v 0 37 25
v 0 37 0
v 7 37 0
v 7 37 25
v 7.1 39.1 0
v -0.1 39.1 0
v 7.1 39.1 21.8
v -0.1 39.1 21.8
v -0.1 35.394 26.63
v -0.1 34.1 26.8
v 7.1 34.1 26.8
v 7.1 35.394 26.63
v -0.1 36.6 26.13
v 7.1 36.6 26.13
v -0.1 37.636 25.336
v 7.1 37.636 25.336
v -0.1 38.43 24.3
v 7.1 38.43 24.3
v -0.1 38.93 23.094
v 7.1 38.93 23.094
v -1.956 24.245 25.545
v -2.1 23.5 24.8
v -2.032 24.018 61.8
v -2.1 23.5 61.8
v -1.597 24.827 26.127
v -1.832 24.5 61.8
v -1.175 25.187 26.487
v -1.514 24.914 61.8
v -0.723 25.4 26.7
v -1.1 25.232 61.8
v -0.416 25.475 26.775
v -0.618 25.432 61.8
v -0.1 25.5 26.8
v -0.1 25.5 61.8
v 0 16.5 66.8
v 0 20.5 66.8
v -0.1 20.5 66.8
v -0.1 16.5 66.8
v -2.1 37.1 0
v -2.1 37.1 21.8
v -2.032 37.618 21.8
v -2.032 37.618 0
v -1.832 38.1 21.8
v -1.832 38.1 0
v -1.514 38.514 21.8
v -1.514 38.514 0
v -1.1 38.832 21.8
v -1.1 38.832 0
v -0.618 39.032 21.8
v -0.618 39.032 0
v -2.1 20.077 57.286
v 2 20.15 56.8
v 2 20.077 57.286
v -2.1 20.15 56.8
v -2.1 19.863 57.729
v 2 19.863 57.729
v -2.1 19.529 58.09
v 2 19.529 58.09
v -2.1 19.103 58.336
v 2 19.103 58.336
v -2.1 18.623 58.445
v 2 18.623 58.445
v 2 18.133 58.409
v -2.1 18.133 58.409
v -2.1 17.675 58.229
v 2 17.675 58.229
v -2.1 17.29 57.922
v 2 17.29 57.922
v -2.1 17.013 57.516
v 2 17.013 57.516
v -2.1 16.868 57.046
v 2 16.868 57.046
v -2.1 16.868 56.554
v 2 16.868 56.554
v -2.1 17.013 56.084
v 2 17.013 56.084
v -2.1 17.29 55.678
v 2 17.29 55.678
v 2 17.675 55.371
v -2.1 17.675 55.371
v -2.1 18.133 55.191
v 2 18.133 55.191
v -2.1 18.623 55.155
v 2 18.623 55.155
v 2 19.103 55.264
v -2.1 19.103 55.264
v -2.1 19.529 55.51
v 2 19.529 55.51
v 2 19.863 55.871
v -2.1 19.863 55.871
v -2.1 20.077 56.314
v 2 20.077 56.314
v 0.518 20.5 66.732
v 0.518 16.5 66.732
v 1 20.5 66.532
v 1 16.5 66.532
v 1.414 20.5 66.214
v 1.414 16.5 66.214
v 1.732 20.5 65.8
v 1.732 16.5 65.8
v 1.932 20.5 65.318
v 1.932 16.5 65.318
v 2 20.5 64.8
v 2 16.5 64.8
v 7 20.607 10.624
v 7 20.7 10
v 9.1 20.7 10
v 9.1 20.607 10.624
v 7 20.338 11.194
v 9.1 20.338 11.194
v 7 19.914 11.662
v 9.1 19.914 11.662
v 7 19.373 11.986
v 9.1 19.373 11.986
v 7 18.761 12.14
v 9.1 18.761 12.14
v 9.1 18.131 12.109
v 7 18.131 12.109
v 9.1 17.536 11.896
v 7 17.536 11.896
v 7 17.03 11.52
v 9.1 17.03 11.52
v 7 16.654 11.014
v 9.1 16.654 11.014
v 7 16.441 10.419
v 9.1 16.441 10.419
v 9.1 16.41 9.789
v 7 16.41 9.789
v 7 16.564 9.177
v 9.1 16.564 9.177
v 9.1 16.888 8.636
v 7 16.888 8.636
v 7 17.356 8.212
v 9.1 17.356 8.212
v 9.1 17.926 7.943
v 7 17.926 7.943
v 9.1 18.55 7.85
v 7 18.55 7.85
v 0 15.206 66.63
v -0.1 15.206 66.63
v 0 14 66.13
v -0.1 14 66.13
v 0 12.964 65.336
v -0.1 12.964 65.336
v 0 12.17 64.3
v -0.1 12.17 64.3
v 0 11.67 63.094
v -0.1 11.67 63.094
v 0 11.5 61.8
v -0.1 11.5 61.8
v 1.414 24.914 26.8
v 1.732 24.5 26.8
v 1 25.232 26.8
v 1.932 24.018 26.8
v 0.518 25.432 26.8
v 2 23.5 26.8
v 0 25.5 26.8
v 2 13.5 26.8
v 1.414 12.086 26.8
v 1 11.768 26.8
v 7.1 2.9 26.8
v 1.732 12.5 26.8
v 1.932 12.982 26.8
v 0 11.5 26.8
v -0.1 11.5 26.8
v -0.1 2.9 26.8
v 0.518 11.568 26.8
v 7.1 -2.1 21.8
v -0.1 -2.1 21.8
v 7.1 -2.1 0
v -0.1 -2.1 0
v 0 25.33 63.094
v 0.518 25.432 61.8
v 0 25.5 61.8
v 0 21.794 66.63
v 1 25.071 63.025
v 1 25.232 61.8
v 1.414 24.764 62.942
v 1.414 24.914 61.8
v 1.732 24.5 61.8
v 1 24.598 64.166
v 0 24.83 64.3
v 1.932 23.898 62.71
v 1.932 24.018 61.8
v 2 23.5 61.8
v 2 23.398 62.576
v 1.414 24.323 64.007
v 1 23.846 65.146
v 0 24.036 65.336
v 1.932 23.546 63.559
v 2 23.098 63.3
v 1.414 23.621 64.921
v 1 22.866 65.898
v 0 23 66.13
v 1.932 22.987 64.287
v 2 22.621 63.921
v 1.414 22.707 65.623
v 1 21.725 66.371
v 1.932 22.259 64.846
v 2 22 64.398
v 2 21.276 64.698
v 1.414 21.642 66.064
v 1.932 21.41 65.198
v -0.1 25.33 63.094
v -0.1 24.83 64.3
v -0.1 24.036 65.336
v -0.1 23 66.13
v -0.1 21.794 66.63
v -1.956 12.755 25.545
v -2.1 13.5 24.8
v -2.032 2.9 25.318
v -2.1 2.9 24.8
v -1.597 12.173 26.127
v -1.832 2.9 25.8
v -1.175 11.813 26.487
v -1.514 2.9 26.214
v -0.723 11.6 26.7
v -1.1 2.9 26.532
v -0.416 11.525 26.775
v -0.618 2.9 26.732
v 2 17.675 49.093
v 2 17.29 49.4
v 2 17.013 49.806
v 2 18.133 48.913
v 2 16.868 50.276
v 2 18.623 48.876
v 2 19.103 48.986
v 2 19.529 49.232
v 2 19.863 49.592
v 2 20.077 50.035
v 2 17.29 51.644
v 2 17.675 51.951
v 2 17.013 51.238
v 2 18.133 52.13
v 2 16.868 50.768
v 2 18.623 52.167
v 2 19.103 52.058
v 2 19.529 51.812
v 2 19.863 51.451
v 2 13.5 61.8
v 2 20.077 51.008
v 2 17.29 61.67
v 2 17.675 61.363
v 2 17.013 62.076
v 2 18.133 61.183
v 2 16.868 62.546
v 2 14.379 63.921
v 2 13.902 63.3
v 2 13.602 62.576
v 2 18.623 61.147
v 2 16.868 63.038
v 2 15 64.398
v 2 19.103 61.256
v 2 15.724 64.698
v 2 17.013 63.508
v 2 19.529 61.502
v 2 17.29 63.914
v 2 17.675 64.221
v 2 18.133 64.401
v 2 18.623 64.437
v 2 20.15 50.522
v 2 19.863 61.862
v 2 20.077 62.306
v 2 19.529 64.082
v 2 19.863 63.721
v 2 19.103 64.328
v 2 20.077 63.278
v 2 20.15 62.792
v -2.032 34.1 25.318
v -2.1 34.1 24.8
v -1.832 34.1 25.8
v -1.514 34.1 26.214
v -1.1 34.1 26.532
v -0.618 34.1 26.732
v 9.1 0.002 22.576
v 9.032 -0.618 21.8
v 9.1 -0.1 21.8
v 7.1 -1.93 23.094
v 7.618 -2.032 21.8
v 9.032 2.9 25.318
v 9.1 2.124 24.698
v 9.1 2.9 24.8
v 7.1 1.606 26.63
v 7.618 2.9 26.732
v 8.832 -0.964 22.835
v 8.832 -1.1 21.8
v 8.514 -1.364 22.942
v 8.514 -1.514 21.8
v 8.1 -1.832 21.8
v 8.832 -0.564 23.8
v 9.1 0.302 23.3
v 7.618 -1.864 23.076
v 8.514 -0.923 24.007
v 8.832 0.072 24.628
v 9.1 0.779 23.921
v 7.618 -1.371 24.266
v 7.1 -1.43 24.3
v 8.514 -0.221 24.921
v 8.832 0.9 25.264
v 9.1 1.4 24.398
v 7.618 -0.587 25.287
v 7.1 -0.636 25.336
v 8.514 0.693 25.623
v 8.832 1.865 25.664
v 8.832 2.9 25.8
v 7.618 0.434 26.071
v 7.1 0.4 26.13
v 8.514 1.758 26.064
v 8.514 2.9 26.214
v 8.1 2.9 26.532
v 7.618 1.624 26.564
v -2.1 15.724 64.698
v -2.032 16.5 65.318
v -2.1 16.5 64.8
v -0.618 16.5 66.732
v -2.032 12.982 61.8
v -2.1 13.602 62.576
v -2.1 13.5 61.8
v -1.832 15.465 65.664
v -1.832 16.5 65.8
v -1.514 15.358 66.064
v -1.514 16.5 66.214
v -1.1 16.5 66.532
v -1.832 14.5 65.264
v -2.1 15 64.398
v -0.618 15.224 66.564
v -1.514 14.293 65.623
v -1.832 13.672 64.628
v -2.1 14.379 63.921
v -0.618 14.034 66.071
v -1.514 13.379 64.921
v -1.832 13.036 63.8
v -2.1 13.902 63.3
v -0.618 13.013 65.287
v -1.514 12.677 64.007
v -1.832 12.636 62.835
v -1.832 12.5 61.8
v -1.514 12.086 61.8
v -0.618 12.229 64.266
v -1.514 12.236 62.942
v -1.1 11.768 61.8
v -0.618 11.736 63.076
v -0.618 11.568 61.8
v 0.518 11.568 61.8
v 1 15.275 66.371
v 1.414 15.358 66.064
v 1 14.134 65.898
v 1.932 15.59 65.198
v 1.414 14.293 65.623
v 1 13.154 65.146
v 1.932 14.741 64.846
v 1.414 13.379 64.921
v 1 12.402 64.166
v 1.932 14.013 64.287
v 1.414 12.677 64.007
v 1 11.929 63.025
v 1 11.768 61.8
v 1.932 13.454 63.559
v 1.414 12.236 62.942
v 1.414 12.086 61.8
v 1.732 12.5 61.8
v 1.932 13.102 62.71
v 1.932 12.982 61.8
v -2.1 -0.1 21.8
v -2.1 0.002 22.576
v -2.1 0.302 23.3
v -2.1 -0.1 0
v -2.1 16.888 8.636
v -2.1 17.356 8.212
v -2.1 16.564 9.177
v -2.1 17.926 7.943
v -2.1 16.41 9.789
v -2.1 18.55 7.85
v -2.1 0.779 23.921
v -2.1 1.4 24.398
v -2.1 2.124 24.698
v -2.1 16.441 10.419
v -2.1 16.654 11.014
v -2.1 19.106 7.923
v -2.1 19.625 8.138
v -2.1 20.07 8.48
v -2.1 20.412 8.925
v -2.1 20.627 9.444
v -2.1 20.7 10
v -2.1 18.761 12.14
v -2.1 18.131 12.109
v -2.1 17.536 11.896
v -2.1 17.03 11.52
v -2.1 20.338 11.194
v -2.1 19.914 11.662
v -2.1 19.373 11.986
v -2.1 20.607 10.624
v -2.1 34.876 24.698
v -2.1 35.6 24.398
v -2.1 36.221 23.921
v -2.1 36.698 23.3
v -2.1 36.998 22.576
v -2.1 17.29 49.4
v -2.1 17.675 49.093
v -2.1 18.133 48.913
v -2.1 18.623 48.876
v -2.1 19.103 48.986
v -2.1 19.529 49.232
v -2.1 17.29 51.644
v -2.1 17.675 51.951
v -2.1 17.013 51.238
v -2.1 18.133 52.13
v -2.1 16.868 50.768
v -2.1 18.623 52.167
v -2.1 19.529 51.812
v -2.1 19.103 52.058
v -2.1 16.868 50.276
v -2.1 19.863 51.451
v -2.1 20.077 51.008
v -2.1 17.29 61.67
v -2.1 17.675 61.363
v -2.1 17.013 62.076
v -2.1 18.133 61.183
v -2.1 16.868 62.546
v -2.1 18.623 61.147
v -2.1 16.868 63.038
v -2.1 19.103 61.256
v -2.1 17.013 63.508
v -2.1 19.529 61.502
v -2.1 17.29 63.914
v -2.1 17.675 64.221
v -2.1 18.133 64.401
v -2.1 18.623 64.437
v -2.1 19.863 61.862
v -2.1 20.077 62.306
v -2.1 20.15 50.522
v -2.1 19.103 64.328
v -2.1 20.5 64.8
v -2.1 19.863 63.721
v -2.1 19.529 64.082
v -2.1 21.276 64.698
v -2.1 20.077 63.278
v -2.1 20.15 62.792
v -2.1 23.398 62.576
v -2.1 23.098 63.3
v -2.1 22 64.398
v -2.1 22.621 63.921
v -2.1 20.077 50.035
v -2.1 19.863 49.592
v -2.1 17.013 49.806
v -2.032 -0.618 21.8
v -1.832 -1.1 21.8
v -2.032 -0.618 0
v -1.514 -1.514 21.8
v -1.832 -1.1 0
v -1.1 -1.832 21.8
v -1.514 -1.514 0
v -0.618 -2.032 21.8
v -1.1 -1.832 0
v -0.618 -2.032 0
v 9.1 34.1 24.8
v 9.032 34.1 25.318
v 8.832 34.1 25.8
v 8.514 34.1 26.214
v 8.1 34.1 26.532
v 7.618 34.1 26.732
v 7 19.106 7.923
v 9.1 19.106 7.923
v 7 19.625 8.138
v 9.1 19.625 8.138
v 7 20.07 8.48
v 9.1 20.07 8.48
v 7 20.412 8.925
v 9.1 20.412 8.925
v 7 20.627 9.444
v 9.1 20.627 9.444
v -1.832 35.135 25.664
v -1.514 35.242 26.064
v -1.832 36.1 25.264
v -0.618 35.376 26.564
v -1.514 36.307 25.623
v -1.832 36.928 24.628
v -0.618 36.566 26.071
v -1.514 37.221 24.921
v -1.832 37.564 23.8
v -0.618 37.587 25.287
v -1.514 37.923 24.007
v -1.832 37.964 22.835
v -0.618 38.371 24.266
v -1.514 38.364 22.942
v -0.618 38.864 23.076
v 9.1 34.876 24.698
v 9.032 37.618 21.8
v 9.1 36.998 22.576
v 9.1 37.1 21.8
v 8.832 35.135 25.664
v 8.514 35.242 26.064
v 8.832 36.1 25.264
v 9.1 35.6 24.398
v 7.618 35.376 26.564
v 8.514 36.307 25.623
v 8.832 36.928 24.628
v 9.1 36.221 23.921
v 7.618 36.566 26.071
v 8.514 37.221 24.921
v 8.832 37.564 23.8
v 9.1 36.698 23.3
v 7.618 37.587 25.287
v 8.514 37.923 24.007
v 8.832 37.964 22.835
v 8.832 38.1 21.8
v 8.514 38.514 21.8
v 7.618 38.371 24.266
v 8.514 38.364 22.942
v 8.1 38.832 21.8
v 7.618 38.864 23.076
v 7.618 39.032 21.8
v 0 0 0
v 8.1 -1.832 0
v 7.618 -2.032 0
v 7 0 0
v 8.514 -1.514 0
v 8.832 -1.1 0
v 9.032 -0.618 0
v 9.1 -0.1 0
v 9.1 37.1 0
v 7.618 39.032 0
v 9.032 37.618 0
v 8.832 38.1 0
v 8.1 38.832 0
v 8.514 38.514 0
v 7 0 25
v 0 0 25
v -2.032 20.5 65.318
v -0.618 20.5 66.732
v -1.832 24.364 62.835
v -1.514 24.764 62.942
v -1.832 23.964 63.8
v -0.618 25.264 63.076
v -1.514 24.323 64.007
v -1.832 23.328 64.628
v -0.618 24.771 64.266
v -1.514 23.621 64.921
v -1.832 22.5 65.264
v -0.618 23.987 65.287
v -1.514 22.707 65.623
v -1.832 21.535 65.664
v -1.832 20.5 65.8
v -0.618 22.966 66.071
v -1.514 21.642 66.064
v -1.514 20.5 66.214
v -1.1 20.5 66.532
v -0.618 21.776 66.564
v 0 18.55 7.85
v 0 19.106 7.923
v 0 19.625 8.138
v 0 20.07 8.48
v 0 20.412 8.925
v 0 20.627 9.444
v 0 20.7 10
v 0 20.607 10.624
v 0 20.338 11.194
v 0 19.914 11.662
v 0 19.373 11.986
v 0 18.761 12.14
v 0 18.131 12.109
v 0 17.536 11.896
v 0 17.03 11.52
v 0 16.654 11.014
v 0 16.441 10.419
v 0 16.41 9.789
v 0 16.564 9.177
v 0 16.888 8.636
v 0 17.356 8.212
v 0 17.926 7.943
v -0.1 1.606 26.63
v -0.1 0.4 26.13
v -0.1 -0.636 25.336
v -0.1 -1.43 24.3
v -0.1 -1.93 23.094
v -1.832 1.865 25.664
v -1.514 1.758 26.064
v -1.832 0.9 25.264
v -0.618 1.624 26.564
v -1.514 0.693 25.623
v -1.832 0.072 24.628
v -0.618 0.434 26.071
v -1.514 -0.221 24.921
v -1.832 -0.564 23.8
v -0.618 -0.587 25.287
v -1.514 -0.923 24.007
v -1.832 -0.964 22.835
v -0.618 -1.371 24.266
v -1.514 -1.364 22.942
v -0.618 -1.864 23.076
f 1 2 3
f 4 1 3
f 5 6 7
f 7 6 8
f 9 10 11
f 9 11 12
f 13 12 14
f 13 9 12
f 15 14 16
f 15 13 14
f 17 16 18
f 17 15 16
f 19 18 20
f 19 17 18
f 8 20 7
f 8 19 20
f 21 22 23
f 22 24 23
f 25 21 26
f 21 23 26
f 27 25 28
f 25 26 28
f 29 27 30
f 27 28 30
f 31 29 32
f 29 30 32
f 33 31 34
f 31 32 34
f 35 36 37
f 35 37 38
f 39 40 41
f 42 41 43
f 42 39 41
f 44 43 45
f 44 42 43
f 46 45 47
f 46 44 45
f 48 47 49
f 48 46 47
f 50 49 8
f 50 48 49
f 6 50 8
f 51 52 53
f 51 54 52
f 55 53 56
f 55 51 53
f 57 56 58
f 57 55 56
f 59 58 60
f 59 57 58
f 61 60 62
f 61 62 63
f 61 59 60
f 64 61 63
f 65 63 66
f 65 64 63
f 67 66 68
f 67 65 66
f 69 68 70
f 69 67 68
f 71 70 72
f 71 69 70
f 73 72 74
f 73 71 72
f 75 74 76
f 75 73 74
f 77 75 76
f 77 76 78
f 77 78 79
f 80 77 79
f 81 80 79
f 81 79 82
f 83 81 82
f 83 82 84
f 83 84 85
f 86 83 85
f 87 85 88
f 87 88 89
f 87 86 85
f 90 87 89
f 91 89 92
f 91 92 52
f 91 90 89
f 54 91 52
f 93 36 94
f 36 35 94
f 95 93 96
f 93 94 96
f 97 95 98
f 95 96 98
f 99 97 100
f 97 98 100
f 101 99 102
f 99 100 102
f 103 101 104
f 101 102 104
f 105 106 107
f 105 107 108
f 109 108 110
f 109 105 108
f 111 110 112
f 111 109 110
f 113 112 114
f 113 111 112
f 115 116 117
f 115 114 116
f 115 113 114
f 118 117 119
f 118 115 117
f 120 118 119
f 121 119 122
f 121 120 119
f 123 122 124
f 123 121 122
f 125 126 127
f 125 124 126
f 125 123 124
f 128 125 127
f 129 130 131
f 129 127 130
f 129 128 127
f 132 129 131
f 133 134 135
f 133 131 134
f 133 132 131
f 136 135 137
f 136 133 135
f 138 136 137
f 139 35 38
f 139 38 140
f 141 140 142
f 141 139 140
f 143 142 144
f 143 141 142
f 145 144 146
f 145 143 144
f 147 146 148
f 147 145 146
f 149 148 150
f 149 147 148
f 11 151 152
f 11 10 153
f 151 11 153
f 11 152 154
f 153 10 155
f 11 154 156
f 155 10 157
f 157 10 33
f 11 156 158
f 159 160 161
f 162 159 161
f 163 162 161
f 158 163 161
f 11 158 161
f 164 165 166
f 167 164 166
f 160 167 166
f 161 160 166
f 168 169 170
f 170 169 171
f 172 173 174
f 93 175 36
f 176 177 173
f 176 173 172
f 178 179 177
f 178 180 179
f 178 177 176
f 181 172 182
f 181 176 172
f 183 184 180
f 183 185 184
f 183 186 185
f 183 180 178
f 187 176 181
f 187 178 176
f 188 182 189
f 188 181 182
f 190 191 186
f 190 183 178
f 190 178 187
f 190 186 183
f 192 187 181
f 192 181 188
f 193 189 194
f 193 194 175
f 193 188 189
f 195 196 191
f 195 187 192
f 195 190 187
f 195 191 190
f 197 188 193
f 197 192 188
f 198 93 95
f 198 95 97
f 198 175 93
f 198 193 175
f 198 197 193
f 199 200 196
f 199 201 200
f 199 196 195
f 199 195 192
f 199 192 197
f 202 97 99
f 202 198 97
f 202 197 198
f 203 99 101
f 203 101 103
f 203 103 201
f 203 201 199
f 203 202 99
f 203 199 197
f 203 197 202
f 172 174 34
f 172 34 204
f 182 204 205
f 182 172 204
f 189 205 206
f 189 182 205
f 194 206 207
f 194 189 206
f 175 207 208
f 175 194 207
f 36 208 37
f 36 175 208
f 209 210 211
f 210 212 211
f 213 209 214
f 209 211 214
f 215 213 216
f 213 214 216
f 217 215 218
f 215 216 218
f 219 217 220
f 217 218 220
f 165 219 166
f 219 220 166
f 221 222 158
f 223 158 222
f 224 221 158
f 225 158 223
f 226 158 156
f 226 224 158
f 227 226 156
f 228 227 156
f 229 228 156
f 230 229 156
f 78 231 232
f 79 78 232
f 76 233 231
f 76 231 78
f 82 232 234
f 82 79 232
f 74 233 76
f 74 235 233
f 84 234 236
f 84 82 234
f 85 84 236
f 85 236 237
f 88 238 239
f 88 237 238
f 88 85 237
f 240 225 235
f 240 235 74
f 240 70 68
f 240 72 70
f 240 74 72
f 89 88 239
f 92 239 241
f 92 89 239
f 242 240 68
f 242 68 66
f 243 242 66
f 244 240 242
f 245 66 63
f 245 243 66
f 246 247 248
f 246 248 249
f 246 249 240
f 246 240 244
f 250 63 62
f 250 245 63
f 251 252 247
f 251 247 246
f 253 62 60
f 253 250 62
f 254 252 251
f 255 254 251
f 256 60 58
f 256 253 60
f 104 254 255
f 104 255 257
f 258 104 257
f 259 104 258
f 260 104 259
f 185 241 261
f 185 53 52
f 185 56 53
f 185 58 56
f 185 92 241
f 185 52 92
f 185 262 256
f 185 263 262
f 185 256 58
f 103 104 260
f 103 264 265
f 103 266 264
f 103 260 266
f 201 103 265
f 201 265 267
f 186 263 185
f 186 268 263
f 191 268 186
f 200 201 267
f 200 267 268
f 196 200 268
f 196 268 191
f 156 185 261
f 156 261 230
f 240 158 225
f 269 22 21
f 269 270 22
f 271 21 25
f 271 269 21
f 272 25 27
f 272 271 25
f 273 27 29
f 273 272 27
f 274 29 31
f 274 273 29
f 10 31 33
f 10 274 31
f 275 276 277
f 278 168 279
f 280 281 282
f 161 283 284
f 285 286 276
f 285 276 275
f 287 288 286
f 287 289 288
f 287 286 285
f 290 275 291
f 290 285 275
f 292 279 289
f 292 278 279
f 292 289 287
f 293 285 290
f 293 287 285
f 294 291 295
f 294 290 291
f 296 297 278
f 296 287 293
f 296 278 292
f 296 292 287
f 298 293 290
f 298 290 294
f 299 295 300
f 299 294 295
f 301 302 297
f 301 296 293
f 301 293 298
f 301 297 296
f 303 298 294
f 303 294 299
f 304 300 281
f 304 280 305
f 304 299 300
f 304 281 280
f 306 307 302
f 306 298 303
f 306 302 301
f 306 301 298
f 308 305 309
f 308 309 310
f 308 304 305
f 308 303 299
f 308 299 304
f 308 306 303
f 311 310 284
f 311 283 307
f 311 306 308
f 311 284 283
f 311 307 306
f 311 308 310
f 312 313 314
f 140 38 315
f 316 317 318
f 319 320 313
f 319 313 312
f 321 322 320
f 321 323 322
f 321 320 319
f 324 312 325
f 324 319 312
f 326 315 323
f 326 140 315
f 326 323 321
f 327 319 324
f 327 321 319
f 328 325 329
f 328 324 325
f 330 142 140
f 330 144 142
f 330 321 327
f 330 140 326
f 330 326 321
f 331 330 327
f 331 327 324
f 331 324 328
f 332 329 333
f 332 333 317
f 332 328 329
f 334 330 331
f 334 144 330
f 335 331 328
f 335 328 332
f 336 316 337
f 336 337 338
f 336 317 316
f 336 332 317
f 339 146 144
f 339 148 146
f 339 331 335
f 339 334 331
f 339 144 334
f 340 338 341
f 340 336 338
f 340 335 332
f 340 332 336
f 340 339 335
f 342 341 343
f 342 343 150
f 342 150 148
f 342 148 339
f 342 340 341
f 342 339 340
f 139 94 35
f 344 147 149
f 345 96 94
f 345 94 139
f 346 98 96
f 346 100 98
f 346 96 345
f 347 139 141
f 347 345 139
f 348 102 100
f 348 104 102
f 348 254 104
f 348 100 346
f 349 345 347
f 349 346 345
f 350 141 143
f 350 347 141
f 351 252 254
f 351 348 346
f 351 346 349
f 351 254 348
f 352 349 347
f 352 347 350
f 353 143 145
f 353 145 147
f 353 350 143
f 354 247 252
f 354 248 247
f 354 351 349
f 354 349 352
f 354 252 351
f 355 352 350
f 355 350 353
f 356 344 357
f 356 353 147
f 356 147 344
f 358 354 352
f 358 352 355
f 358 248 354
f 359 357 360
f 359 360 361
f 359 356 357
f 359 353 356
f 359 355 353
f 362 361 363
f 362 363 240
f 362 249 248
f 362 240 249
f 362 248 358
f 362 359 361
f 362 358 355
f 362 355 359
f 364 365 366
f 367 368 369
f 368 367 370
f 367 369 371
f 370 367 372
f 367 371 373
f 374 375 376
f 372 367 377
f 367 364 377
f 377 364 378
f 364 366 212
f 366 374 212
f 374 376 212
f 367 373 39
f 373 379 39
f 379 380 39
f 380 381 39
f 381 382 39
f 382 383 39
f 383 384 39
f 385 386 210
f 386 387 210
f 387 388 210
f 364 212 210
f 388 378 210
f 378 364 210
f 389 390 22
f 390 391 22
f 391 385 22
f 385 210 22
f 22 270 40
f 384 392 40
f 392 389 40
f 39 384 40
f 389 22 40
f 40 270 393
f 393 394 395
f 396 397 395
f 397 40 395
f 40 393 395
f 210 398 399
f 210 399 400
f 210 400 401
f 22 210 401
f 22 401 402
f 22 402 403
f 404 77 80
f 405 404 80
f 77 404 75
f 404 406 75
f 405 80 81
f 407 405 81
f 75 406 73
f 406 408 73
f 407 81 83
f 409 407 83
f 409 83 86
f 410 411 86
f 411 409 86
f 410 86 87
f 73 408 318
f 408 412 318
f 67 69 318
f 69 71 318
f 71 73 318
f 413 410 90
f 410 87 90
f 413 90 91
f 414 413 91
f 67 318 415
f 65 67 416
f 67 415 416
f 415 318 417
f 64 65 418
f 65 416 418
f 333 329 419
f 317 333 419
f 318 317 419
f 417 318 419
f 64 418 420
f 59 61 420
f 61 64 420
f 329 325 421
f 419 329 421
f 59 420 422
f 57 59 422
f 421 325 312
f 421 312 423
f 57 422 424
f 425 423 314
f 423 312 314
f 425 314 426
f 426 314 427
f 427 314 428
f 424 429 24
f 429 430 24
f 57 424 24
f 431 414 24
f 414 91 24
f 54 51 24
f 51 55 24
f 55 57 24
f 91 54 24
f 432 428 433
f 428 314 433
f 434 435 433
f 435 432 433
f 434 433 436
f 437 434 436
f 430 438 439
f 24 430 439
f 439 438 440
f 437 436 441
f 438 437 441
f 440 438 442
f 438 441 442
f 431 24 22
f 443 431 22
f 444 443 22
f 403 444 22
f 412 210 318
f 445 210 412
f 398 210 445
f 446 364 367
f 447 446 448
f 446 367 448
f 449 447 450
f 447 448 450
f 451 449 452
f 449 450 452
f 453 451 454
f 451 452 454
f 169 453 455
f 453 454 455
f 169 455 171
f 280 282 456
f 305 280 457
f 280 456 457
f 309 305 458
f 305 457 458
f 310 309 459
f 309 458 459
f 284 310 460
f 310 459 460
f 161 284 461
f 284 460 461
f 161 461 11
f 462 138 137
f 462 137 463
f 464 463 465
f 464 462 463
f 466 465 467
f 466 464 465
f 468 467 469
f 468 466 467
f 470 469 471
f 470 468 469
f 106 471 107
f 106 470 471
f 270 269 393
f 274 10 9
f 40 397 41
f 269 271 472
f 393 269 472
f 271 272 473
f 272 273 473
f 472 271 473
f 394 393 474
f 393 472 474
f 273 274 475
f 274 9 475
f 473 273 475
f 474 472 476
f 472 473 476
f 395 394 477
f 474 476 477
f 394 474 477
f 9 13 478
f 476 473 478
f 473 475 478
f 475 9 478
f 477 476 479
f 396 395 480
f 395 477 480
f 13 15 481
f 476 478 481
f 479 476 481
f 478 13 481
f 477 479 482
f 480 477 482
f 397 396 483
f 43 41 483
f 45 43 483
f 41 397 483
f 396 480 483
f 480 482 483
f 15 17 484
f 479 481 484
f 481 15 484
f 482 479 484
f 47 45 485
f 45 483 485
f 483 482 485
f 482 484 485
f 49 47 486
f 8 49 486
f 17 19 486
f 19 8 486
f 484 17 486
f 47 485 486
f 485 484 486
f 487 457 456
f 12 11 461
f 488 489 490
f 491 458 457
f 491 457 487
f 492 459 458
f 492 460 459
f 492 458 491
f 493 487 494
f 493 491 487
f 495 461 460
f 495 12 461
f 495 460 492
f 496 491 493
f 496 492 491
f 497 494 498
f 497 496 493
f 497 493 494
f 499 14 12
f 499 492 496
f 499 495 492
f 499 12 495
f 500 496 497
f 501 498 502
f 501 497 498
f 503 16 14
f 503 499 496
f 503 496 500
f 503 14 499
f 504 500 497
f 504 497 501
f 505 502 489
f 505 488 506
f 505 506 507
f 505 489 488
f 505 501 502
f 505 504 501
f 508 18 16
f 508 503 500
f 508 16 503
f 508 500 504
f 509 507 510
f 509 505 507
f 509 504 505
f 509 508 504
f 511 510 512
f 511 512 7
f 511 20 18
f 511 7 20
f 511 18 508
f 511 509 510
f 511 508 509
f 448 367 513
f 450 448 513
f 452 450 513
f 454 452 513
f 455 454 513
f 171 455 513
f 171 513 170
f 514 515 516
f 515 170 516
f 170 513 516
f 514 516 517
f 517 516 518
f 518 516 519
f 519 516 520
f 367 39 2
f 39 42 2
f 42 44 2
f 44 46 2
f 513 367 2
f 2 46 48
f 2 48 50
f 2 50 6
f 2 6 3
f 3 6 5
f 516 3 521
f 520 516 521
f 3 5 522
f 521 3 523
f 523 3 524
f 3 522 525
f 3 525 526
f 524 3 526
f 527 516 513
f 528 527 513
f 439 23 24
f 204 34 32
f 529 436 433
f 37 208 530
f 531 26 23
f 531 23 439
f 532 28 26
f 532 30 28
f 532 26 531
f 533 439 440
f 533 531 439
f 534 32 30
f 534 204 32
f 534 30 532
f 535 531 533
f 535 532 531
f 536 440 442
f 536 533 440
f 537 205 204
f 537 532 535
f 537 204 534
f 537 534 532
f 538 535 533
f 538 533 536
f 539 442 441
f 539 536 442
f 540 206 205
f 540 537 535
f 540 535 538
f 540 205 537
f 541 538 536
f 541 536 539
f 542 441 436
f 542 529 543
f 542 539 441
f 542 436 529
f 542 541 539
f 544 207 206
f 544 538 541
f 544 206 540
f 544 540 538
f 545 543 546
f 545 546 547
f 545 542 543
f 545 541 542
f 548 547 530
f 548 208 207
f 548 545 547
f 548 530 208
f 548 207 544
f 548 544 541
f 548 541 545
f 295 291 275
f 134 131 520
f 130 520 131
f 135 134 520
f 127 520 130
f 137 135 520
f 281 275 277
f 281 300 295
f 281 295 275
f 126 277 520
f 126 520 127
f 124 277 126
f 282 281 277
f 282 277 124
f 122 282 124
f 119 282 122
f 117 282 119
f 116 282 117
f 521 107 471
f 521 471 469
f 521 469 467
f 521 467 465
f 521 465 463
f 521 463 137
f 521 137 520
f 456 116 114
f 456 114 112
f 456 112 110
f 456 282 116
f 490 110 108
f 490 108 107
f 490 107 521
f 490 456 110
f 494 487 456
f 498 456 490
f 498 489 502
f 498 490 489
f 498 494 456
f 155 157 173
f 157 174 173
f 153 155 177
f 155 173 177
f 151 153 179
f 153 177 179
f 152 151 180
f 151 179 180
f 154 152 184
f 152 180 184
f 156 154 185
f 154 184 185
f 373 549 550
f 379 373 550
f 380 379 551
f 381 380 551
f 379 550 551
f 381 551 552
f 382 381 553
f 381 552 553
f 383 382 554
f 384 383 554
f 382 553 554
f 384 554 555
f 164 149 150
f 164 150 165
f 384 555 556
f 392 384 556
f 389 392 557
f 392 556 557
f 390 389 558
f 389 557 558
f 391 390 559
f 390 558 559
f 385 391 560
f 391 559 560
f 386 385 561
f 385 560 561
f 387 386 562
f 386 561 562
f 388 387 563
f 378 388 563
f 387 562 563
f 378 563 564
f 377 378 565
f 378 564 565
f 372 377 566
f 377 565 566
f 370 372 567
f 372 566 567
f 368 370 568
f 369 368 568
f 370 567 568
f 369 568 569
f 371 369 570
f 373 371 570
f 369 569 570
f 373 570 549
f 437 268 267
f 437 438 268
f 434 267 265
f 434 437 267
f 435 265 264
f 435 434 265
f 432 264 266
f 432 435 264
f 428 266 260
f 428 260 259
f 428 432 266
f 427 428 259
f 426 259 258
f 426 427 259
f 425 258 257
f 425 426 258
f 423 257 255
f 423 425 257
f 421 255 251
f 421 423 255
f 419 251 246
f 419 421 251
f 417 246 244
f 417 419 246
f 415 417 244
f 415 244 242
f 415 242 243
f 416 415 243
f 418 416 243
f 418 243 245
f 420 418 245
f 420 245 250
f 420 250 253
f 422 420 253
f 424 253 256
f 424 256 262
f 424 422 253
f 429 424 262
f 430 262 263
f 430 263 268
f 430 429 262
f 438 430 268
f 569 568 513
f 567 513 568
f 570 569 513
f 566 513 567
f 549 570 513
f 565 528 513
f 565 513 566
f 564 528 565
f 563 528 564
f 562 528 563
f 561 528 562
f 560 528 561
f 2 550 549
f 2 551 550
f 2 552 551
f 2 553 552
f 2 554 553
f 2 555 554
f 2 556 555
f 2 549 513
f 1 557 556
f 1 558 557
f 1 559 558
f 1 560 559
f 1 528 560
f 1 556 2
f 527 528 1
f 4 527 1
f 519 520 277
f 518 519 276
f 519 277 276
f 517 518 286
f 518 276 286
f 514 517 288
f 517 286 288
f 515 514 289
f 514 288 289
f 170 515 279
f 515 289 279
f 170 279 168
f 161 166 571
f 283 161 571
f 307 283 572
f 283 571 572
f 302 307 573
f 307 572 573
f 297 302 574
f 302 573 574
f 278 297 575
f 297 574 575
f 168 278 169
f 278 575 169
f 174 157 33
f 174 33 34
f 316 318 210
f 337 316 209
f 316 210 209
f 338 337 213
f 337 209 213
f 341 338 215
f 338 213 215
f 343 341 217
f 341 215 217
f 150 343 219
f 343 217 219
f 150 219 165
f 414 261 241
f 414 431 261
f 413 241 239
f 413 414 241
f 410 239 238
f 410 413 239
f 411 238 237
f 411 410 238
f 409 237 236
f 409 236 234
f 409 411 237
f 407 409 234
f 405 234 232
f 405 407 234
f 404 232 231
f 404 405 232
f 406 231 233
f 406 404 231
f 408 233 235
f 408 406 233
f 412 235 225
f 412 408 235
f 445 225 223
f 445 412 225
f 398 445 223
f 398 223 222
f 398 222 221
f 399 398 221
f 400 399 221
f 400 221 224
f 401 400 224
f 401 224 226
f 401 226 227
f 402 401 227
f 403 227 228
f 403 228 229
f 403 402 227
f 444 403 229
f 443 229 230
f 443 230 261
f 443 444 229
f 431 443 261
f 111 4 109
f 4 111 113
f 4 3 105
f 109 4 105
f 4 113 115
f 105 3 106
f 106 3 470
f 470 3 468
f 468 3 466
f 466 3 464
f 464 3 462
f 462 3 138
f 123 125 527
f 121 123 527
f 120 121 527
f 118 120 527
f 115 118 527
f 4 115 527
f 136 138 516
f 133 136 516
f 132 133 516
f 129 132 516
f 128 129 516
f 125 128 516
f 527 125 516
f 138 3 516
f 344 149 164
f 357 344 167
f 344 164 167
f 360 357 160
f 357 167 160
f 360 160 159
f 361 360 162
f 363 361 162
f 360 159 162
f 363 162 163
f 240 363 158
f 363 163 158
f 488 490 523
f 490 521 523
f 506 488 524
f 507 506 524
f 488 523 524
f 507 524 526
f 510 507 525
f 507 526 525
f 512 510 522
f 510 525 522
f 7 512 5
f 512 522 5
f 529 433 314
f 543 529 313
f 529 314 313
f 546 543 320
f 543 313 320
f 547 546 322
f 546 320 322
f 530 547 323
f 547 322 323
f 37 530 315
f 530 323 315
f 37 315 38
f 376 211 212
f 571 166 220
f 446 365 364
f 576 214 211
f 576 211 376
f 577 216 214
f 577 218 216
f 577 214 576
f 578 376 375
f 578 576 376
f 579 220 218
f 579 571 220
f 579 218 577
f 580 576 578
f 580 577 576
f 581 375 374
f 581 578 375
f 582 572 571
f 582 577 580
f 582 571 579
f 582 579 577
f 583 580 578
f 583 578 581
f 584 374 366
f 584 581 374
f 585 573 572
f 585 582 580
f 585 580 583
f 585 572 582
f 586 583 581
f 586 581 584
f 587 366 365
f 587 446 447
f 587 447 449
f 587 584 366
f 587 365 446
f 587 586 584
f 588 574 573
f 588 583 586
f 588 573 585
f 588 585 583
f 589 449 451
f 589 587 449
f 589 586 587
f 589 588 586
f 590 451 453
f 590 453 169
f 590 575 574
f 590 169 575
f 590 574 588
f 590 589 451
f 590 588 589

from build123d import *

# Parameters (mm, degrees)
F0_W          = 11.2
F0_H          = 41.2
F1_DEPTH      = 25
F3_DEPTH      = 2.1
F3_DEPTH_BACK = 9.1
F2_R          = 1.65
F4_DEPTH      = 2
F4_DEPTH_BACK = 2.1
F5_R          = 5
F6_R          = 2
F8_DEPTH      = 2.101
F8_DEPTH_BACK = 9.101


with BuildPart() as f1:
    # F0 (on Top) → F1 (new body)
    with BuildSketch(Plane.XY):
        with Locations((3.5, 18.5)):
            Rectangle(F0_W, F0_H)
        Polygon((7, 0), (0, 0), (0, 18.5), (0, 37), (7, 37), (7, 18.5), align=None, mode=Mode.SUBTRACT)
    extrude(amount=F1_DEPTH)

    # F2 (on Right) → F3 (join, two sides)
    with BuildSketch(Plane.YZ) as f3_sk:
        Polygon((-2.1, 26.8), (-2.1, 25), (39.1, 25), (39.1, 26.8), (25.5, 26.8), (18.5, 26.8), (11.5, 26.8), align=None)
    extrude(amount=-F3_DEPTH)
    extrude(f3_sk.sketch, amount=F3_DEPTH_BACK)

    # F2 (on Right) → F4 (join, two sides)
    with BuildSketch(Plane.YZ) as f4_sk:
        with BuildLine():
            Line((11.5, 61.8), (11.5, 26.8))
            Line((11.5, 26.8), (18.5, 26.8))
            Line((18.5, 26.8), (25.5, 26.8))
            Line((25.5, 26.8), (25.5, 61.8))
            ThreePointArc((25.5, 61.8), (24.0355339059, 65.3355339059), (20.5, 66.8))
            Line((20.5, 66.8), (16.5, 66.8))
            ThreePointArc((16.5, 66.8), (12.9644660941, 65.3355339059), (11.5, 61.8))
        make_face()
        with Locations((18.5, 50.5218207836)):
            Circle(F2_R, mode=Mode.SUBTRACT)
        with Locations((18.5, 56.8)):
            Circle(F2_R, mode=Mode.SUBTRACT)
        with Locations((18.5, 62.7918988466)):
            Circle(F2_R, mode=Mode.SUBTRACT)
    extrude(amount=F4_DEPTH)
    extrude(f4_sk.sketch, amount=-F4_DEPTH_BACK)

    # F5
    f5_edges = [f1.edges().sort_by_distance(p)[0] for p in [
        (3.5, -2.1, 26.8),
        (3.5, 39.1, 26.8),
    ]]
    fillet(f5_edges, radius=F5_R)

    # F6
    f6_edges = [f1.edges().sort_by_distance(p)[0] for p in [
        (-2.1, -2.1, 10.9),
        (-2.1, 39.1, 10.9),
        (9.1, -2.1, 10.9),
        (-2.1, 11.5, 44.3),
        (2, 11.5, 44.3),
    ]]
    fillet(f6_edges, radius=F6_R)

    # F7 (on Right) → F8 (cut, two sides)
    with BuildSketch(Plane.YZ) as f8_sk:
        with BuildLine():
            ThreePointArc((18.55, 7.85), (20.0702795796, 8.4797204204), (20.7, 10))
            ThreePointArc((20.7, 10), (17.0297204204, 11.5202795796), (18.55, 7.85))
        make_face()
    extrude(amount=-F8_DEPTH, mode=Mode.SUBTRACT)
    extrude(f8_sk.sketch, amount=F8_DEPTH_BACK, mode=Mode.SUBTRACT)


solid = f1.part
